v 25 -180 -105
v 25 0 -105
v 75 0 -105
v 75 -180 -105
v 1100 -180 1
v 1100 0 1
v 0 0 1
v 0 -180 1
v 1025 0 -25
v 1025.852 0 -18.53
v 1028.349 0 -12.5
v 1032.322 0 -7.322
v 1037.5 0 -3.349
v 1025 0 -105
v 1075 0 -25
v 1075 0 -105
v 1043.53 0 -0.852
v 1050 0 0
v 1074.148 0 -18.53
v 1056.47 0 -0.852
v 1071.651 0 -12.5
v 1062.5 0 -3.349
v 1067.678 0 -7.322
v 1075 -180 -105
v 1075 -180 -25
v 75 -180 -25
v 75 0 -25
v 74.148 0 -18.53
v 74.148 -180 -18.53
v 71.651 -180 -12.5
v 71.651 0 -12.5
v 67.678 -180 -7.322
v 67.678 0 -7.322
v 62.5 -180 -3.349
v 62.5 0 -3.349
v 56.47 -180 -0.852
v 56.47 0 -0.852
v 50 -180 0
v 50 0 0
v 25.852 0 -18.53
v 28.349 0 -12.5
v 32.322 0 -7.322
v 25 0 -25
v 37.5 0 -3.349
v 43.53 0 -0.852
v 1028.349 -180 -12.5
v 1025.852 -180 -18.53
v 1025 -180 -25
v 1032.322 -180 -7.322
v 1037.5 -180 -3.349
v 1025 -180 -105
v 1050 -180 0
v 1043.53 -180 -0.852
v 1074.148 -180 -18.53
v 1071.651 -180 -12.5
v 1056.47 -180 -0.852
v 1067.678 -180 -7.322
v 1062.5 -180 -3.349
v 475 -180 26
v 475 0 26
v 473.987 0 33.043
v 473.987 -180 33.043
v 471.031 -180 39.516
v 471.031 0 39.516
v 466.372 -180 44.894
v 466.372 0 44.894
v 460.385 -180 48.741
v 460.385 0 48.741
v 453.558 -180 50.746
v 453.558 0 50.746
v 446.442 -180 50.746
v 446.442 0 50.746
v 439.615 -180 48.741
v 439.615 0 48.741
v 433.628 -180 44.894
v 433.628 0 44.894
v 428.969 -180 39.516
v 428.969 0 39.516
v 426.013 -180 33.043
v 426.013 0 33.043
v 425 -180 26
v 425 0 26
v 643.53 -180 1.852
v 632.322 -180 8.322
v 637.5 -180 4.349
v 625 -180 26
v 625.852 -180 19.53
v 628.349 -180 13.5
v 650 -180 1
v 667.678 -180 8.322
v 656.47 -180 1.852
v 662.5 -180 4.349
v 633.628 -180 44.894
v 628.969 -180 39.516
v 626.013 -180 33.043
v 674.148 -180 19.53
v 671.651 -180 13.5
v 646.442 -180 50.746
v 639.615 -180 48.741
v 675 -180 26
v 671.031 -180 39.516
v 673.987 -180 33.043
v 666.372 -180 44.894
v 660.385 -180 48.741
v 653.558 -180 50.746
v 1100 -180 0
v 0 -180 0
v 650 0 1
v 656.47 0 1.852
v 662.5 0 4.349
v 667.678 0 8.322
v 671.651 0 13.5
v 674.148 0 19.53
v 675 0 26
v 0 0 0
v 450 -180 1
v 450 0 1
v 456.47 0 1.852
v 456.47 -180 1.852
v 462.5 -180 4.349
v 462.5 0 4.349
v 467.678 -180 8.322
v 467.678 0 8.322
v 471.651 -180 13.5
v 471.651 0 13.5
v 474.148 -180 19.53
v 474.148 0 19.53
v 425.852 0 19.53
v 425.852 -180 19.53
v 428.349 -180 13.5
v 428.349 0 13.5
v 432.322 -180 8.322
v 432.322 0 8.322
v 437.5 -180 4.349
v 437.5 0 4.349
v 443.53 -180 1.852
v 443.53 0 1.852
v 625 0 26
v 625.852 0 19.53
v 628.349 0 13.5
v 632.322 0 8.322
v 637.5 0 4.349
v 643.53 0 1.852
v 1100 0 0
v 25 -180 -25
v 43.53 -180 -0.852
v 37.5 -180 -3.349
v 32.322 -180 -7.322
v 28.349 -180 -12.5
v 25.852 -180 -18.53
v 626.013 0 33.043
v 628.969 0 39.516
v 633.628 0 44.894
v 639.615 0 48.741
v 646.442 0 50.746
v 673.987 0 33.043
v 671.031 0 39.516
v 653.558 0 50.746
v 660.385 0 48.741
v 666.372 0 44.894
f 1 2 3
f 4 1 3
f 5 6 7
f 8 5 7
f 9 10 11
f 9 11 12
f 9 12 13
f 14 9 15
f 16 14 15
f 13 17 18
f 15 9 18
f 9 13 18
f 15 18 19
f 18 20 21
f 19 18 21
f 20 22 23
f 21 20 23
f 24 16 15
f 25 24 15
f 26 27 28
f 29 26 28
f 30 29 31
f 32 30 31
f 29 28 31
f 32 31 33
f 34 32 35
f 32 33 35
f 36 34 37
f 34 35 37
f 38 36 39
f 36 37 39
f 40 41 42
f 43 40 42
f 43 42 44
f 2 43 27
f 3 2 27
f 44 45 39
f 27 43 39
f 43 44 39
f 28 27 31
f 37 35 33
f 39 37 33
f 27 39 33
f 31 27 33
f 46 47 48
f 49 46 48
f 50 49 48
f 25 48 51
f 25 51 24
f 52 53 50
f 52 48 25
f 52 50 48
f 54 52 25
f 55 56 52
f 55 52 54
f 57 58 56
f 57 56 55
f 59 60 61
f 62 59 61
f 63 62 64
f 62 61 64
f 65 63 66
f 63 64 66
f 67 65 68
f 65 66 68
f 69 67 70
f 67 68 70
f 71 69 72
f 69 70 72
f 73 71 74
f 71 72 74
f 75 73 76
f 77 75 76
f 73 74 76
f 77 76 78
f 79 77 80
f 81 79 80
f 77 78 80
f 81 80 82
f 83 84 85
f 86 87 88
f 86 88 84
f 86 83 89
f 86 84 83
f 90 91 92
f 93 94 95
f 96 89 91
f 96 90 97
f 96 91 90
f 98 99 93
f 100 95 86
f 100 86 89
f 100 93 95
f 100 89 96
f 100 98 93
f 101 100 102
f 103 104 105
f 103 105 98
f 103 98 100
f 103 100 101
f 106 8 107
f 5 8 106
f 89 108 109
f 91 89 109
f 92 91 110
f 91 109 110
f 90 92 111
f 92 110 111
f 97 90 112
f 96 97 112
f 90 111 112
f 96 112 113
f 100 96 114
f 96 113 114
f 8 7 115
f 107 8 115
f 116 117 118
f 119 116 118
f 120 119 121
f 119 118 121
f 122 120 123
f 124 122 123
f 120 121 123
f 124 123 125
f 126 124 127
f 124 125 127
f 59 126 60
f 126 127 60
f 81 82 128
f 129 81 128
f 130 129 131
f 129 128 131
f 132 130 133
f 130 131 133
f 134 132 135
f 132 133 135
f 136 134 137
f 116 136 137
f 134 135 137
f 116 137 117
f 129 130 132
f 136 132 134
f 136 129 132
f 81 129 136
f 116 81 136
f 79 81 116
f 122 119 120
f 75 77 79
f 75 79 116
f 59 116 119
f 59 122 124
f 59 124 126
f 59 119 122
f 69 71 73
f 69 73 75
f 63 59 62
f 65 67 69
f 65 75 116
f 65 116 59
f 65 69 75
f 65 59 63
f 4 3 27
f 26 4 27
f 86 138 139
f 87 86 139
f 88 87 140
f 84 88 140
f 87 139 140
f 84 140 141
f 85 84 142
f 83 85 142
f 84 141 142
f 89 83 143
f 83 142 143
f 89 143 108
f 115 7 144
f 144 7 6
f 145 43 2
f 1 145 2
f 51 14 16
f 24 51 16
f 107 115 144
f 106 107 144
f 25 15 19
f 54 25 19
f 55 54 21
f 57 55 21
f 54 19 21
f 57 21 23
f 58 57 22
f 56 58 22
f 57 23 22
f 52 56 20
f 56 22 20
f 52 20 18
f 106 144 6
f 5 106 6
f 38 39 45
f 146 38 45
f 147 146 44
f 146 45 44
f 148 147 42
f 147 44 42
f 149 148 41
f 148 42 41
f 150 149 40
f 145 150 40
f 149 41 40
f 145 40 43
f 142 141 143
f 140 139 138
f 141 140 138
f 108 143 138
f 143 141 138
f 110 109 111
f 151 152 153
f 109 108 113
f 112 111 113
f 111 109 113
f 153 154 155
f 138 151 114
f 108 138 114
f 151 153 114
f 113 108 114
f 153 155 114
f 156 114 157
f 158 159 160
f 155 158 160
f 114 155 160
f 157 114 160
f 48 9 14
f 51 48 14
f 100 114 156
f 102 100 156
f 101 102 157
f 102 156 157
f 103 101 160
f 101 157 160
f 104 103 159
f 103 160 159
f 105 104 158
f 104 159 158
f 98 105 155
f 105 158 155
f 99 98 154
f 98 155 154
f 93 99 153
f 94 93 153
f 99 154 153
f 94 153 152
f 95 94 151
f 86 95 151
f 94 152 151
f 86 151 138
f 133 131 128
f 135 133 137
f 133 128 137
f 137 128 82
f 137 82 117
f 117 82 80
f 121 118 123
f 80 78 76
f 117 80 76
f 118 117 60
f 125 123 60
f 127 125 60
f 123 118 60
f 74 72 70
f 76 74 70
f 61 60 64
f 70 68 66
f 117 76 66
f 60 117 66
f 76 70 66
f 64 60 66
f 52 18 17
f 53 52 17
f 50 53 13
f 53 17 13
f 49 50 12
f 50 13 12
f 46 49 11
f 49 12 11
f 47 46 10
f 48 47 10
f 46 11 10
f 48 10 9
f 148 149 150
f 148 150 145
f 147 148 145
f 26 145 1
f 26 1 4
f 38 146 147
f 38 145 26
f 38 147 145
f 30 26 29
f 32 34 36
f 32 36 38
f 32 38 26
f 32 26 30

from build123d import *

# Parameters (mm, degrees)
F1_DEPTH = 180
F2_DEPTH = 180


with BuildPart() as f1:
    # F0 (on Front) → F1 (new body)
    with BuildSketch(Plane.XZ):
        Polygon((0, 1), (0, 0), (50, 0), (1050, 0), (1100, 0), (1100, 1), (650, 1), (450, 1), align=None)
    extrude(amount=F1_DEPTH)


with BuildPart() as f2:
    # F0 (on Front) → F2 (new body)
    with BuildSketch(Plane.XZ):
        with BuildLine():
            ThreePointArc((75, -25), (67.67767, -7.32233), (50, 0))
            ThreePointArc((50, 0), (32.32233, -7.32233), (25, -25))
            Line((25, -25), (25, -105))
            Line((25, -105), (75, -105))
            Line((75, -105), (75, -25))
        make_face()
        with BuildLine():
            ThreePointArc((425, 26), (432.32233, 8.32233), (450, 1))
            ThreePointArc((450, 1), (467.67767, 8.32233), (475, 26))
            ThreePointArc((475, 26), (450, 51), (425, 26))
        make_face()
        with BuildLine():
            ThreePointArc((625, 26), (632.32233, 8.32233), (650, 1))
            ThreePointArc((650, 1), (667.67767, 8.32233), (675, 26))
            ThreePointArc((675, 26), (650, 51), (625, 26))
        make_face()
        with BuildLine():
            ThreePointArc((1075, -25), (1067.67767, -7.32233), (1050, 0))
            ThreePointArc((1050, 0), (1032.32233, -7.32233), (1025, -25))
            Line((1025, -25), (1025, -105))
            Line((1025, -105), (1075, -105))
            Line((1075, -105), (1075, -25))
        make_face()
    extrude(amount=F2_DEPTH)


solid = Compound([f1.part, f2.part])
